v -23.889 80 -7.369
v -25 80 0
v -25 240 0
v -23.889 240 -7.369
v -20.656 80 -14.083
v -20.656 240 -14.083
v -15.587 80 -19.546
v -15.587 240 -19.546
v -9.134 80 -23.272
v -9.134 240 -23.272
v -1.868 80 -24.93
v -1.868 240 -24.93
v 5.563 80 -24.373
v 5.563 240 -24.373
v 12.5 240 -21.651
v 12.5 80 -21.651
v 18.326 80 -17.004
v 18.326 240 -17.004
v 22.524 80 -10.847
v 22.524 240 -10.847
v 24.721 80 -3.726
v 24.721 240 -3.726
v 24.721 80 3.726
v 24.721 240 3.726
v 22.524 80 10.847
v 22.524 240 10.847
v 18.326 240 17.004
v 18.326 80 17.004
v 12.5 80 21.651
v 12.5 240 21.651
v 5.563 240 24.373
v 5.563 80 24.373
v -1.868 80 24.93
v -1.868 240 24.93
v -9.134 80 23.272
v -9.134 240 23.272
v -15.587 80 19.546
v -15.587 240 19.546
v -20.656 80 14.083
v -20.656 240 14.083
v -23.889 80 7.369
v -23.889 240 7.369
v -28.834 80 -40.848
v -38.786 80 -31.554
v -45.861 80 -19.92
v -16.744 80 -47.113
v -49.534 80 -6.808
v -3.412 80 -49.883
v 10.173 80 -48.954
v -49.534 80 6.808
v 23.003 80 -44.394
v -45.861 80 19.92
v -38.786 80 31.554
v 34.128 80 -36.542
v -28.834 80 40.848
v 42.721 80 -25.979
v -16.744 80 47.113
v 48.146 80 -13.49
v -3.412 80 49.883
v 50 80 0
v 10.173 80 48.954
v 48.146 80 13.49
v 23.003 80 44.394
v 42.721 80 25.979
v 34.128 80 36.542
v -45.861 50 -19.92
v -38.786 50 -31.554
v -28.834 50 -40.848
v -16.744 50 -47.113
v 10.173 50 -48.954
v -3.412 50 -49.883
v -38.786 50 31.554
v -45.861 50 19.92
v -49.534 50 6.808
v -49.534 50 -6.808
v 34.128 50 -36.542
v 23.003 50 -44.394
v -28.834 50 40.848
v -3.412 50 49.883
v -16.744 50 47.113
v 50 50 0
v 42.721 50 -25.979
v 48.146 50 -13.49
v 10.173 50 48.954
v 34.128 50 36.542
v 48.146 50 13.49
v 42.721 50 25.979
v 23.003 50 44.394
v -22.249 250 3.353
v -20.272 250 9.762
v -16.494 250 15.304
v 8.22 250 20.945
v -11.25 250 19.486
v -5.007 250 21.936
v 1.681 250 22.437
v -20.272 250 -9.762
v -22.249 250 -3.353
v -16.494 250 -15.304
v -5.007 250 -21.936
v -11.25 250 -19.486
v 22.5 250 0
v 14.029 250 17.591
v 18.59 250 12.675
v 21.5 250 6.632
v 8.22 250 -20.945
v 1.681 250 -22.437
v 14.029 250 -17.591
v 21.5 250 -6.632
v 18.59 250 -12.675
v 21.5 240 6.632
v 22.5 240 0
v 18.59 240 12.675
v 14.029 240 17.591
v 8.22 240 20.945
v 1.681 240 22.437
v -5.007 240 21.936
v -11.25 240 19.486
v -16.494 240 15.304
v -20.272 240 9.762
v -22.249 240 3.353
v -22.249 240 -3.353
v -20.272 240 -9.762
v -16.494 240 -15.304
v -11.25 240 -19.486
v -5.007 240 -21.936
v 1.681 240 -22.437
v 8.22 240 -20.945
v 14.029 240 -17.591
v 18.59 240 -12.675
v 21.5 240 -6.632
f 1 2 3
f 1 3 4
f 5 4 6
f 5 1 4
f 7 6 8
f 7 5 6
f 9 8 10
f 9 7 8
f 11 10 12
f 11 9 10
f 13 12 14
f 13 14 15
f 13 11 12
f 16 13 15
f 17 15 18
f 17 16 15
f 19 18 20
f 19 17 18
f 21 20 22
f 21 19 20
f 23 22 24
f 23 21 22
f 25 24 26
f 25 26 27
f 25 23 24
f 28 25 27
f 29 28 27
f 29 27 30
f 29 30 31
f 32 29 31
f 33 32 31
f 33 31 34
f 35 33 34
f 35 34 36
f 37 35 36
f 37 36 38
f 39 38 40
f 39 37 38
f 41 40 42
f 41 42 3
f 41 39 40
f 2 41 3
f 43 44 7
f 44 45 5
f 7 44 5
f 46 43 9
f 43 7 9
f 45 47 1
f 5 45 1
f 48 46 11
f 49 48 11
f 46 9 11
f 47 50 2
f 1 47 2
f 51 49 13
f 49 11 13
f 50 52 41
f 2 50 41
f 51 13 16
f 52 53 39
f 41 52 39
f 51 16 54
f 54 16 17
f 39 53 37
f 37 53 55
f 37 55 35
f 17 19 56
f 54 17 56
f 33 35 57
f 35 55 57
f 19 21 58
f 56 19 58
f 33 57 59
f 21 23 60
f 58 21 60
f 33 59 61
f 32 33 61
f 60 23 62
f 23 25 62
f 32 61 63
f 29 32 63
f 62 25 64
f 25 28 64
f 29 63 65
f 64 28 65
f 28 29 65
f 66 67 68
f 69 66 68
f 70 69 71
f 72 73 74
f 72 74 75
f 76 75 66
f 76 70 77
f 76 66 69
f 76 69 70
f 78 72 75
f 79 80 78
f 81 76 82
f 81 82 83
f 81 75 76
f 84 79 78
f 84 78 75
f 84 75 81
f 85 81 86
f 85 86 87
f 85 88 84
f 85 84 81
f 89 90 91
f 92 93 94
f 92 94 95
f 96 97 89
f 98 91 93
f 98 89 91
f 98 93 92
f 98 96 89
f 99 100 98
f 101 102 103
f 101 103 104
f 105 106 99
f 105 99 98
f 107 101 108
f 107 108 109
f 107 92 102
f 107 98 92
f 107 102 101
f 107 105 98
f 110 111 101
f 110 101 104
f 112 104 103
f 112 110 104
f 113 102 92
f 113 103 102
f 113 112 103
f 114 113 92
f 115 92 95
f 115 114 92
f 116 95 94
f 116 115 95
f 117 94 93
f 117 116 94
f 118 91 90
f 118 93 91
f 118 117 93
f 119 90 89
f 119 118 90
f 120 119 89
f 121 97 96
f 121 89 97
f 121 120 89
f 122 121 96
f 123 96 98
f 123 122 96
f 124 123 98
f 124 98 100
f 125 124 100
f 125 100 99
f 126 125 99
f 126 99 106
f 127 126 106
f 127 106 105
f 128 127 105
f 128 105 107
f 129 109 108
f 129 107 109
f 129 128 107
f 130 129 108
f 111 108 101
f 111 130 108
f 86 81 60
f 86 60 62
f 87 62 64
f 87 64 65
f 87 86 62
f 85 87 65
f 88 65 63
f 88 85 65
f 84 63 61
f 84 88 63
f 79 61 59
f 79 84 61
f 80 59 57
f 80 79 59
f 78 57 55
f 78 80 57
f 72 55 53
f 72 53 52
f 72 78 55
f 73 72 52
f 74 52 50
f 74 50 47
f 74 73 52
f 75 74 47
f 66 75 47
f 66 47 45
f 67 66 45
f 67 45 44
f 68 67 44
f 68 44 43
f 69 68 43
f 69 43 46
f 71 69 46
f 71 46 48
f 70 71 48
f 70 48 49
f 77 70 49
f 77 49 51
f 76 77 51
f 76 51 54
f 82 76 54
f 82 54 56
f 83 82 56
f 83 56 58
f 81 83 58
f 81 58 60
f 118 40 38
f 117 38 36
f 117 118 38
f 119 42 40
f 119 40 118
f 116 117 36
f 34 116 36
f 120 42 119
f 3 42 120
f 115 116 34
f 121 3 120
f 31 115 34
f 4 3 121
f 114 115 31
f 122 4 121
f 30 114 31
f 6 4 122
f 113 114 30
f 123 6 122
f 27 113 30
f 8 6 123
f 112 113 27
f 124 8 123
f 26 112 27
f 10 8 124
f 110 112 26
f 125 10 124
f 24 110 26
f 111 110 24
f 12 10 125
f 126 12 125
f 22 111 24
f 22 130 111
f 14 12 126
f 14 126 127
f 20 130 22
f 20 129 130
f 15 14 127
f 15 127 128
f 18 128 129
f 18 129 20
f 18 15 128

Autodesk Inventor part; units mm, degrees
ref_plane "YZ Plane" through (0, 0, 0) normal (1, 0, 0) x (0, 1, 0)
ref_plane "XZ Plane" through (0, 0, 0) normal (0, 1, 0) x (-1, 0, 0)
ref_plane "XY Plane" through (0, 0, 0) normal (0, 0, 1) x (1, 0, 0)
sketch "Sketch1" plane through (0, 0, 0) normal (0, 1, 0) x (-1, 0, 0)
  circle A0 centre (0, 0) radius 25
  dimension "d0" = 50
extrude "Extrusion1" add sketch "Sketch1" along normal blind 250
sketch "Sketch2" plane through (0, 250, 0) normal (0, 1, 0) x (1, 0, 0)
  circle A0 centre (0, 0) radius 25
  dimension "d3" = 50
extrude "Extrusion2" cut sketch "Sketch2" against normal blind 10
sketch "Sketch3" plane through (0, 240, 0) normal (0, 1, 0) x (1, 0, 0)
  circle A0 centre (0, 0) radius 22.5
  dimension "d6" = 45
extrude "Extrusion3" add sketch "Sketch3" along normal blind 10
sketch "Sketch4" plane through (0, 0, 0) normal (0, -1, 0) x (1, 0, 0)
  circle A0 centre (0, 0) radius 25
  dimension "d9" = 50
extrude "Extrusion4" cut sketch "Sketch4" against normal blind 50
sketch "Sketch5" plane through (0, 50, 0) normal (0, -1, 0) x (1, 0, 0)
  circle A0 centre (0, 0) radius 50
  dimension "d12" = 100
extrude "Extrusion5" add sketch "Sketch5" against normal blind 30
properties part number "expo1"
